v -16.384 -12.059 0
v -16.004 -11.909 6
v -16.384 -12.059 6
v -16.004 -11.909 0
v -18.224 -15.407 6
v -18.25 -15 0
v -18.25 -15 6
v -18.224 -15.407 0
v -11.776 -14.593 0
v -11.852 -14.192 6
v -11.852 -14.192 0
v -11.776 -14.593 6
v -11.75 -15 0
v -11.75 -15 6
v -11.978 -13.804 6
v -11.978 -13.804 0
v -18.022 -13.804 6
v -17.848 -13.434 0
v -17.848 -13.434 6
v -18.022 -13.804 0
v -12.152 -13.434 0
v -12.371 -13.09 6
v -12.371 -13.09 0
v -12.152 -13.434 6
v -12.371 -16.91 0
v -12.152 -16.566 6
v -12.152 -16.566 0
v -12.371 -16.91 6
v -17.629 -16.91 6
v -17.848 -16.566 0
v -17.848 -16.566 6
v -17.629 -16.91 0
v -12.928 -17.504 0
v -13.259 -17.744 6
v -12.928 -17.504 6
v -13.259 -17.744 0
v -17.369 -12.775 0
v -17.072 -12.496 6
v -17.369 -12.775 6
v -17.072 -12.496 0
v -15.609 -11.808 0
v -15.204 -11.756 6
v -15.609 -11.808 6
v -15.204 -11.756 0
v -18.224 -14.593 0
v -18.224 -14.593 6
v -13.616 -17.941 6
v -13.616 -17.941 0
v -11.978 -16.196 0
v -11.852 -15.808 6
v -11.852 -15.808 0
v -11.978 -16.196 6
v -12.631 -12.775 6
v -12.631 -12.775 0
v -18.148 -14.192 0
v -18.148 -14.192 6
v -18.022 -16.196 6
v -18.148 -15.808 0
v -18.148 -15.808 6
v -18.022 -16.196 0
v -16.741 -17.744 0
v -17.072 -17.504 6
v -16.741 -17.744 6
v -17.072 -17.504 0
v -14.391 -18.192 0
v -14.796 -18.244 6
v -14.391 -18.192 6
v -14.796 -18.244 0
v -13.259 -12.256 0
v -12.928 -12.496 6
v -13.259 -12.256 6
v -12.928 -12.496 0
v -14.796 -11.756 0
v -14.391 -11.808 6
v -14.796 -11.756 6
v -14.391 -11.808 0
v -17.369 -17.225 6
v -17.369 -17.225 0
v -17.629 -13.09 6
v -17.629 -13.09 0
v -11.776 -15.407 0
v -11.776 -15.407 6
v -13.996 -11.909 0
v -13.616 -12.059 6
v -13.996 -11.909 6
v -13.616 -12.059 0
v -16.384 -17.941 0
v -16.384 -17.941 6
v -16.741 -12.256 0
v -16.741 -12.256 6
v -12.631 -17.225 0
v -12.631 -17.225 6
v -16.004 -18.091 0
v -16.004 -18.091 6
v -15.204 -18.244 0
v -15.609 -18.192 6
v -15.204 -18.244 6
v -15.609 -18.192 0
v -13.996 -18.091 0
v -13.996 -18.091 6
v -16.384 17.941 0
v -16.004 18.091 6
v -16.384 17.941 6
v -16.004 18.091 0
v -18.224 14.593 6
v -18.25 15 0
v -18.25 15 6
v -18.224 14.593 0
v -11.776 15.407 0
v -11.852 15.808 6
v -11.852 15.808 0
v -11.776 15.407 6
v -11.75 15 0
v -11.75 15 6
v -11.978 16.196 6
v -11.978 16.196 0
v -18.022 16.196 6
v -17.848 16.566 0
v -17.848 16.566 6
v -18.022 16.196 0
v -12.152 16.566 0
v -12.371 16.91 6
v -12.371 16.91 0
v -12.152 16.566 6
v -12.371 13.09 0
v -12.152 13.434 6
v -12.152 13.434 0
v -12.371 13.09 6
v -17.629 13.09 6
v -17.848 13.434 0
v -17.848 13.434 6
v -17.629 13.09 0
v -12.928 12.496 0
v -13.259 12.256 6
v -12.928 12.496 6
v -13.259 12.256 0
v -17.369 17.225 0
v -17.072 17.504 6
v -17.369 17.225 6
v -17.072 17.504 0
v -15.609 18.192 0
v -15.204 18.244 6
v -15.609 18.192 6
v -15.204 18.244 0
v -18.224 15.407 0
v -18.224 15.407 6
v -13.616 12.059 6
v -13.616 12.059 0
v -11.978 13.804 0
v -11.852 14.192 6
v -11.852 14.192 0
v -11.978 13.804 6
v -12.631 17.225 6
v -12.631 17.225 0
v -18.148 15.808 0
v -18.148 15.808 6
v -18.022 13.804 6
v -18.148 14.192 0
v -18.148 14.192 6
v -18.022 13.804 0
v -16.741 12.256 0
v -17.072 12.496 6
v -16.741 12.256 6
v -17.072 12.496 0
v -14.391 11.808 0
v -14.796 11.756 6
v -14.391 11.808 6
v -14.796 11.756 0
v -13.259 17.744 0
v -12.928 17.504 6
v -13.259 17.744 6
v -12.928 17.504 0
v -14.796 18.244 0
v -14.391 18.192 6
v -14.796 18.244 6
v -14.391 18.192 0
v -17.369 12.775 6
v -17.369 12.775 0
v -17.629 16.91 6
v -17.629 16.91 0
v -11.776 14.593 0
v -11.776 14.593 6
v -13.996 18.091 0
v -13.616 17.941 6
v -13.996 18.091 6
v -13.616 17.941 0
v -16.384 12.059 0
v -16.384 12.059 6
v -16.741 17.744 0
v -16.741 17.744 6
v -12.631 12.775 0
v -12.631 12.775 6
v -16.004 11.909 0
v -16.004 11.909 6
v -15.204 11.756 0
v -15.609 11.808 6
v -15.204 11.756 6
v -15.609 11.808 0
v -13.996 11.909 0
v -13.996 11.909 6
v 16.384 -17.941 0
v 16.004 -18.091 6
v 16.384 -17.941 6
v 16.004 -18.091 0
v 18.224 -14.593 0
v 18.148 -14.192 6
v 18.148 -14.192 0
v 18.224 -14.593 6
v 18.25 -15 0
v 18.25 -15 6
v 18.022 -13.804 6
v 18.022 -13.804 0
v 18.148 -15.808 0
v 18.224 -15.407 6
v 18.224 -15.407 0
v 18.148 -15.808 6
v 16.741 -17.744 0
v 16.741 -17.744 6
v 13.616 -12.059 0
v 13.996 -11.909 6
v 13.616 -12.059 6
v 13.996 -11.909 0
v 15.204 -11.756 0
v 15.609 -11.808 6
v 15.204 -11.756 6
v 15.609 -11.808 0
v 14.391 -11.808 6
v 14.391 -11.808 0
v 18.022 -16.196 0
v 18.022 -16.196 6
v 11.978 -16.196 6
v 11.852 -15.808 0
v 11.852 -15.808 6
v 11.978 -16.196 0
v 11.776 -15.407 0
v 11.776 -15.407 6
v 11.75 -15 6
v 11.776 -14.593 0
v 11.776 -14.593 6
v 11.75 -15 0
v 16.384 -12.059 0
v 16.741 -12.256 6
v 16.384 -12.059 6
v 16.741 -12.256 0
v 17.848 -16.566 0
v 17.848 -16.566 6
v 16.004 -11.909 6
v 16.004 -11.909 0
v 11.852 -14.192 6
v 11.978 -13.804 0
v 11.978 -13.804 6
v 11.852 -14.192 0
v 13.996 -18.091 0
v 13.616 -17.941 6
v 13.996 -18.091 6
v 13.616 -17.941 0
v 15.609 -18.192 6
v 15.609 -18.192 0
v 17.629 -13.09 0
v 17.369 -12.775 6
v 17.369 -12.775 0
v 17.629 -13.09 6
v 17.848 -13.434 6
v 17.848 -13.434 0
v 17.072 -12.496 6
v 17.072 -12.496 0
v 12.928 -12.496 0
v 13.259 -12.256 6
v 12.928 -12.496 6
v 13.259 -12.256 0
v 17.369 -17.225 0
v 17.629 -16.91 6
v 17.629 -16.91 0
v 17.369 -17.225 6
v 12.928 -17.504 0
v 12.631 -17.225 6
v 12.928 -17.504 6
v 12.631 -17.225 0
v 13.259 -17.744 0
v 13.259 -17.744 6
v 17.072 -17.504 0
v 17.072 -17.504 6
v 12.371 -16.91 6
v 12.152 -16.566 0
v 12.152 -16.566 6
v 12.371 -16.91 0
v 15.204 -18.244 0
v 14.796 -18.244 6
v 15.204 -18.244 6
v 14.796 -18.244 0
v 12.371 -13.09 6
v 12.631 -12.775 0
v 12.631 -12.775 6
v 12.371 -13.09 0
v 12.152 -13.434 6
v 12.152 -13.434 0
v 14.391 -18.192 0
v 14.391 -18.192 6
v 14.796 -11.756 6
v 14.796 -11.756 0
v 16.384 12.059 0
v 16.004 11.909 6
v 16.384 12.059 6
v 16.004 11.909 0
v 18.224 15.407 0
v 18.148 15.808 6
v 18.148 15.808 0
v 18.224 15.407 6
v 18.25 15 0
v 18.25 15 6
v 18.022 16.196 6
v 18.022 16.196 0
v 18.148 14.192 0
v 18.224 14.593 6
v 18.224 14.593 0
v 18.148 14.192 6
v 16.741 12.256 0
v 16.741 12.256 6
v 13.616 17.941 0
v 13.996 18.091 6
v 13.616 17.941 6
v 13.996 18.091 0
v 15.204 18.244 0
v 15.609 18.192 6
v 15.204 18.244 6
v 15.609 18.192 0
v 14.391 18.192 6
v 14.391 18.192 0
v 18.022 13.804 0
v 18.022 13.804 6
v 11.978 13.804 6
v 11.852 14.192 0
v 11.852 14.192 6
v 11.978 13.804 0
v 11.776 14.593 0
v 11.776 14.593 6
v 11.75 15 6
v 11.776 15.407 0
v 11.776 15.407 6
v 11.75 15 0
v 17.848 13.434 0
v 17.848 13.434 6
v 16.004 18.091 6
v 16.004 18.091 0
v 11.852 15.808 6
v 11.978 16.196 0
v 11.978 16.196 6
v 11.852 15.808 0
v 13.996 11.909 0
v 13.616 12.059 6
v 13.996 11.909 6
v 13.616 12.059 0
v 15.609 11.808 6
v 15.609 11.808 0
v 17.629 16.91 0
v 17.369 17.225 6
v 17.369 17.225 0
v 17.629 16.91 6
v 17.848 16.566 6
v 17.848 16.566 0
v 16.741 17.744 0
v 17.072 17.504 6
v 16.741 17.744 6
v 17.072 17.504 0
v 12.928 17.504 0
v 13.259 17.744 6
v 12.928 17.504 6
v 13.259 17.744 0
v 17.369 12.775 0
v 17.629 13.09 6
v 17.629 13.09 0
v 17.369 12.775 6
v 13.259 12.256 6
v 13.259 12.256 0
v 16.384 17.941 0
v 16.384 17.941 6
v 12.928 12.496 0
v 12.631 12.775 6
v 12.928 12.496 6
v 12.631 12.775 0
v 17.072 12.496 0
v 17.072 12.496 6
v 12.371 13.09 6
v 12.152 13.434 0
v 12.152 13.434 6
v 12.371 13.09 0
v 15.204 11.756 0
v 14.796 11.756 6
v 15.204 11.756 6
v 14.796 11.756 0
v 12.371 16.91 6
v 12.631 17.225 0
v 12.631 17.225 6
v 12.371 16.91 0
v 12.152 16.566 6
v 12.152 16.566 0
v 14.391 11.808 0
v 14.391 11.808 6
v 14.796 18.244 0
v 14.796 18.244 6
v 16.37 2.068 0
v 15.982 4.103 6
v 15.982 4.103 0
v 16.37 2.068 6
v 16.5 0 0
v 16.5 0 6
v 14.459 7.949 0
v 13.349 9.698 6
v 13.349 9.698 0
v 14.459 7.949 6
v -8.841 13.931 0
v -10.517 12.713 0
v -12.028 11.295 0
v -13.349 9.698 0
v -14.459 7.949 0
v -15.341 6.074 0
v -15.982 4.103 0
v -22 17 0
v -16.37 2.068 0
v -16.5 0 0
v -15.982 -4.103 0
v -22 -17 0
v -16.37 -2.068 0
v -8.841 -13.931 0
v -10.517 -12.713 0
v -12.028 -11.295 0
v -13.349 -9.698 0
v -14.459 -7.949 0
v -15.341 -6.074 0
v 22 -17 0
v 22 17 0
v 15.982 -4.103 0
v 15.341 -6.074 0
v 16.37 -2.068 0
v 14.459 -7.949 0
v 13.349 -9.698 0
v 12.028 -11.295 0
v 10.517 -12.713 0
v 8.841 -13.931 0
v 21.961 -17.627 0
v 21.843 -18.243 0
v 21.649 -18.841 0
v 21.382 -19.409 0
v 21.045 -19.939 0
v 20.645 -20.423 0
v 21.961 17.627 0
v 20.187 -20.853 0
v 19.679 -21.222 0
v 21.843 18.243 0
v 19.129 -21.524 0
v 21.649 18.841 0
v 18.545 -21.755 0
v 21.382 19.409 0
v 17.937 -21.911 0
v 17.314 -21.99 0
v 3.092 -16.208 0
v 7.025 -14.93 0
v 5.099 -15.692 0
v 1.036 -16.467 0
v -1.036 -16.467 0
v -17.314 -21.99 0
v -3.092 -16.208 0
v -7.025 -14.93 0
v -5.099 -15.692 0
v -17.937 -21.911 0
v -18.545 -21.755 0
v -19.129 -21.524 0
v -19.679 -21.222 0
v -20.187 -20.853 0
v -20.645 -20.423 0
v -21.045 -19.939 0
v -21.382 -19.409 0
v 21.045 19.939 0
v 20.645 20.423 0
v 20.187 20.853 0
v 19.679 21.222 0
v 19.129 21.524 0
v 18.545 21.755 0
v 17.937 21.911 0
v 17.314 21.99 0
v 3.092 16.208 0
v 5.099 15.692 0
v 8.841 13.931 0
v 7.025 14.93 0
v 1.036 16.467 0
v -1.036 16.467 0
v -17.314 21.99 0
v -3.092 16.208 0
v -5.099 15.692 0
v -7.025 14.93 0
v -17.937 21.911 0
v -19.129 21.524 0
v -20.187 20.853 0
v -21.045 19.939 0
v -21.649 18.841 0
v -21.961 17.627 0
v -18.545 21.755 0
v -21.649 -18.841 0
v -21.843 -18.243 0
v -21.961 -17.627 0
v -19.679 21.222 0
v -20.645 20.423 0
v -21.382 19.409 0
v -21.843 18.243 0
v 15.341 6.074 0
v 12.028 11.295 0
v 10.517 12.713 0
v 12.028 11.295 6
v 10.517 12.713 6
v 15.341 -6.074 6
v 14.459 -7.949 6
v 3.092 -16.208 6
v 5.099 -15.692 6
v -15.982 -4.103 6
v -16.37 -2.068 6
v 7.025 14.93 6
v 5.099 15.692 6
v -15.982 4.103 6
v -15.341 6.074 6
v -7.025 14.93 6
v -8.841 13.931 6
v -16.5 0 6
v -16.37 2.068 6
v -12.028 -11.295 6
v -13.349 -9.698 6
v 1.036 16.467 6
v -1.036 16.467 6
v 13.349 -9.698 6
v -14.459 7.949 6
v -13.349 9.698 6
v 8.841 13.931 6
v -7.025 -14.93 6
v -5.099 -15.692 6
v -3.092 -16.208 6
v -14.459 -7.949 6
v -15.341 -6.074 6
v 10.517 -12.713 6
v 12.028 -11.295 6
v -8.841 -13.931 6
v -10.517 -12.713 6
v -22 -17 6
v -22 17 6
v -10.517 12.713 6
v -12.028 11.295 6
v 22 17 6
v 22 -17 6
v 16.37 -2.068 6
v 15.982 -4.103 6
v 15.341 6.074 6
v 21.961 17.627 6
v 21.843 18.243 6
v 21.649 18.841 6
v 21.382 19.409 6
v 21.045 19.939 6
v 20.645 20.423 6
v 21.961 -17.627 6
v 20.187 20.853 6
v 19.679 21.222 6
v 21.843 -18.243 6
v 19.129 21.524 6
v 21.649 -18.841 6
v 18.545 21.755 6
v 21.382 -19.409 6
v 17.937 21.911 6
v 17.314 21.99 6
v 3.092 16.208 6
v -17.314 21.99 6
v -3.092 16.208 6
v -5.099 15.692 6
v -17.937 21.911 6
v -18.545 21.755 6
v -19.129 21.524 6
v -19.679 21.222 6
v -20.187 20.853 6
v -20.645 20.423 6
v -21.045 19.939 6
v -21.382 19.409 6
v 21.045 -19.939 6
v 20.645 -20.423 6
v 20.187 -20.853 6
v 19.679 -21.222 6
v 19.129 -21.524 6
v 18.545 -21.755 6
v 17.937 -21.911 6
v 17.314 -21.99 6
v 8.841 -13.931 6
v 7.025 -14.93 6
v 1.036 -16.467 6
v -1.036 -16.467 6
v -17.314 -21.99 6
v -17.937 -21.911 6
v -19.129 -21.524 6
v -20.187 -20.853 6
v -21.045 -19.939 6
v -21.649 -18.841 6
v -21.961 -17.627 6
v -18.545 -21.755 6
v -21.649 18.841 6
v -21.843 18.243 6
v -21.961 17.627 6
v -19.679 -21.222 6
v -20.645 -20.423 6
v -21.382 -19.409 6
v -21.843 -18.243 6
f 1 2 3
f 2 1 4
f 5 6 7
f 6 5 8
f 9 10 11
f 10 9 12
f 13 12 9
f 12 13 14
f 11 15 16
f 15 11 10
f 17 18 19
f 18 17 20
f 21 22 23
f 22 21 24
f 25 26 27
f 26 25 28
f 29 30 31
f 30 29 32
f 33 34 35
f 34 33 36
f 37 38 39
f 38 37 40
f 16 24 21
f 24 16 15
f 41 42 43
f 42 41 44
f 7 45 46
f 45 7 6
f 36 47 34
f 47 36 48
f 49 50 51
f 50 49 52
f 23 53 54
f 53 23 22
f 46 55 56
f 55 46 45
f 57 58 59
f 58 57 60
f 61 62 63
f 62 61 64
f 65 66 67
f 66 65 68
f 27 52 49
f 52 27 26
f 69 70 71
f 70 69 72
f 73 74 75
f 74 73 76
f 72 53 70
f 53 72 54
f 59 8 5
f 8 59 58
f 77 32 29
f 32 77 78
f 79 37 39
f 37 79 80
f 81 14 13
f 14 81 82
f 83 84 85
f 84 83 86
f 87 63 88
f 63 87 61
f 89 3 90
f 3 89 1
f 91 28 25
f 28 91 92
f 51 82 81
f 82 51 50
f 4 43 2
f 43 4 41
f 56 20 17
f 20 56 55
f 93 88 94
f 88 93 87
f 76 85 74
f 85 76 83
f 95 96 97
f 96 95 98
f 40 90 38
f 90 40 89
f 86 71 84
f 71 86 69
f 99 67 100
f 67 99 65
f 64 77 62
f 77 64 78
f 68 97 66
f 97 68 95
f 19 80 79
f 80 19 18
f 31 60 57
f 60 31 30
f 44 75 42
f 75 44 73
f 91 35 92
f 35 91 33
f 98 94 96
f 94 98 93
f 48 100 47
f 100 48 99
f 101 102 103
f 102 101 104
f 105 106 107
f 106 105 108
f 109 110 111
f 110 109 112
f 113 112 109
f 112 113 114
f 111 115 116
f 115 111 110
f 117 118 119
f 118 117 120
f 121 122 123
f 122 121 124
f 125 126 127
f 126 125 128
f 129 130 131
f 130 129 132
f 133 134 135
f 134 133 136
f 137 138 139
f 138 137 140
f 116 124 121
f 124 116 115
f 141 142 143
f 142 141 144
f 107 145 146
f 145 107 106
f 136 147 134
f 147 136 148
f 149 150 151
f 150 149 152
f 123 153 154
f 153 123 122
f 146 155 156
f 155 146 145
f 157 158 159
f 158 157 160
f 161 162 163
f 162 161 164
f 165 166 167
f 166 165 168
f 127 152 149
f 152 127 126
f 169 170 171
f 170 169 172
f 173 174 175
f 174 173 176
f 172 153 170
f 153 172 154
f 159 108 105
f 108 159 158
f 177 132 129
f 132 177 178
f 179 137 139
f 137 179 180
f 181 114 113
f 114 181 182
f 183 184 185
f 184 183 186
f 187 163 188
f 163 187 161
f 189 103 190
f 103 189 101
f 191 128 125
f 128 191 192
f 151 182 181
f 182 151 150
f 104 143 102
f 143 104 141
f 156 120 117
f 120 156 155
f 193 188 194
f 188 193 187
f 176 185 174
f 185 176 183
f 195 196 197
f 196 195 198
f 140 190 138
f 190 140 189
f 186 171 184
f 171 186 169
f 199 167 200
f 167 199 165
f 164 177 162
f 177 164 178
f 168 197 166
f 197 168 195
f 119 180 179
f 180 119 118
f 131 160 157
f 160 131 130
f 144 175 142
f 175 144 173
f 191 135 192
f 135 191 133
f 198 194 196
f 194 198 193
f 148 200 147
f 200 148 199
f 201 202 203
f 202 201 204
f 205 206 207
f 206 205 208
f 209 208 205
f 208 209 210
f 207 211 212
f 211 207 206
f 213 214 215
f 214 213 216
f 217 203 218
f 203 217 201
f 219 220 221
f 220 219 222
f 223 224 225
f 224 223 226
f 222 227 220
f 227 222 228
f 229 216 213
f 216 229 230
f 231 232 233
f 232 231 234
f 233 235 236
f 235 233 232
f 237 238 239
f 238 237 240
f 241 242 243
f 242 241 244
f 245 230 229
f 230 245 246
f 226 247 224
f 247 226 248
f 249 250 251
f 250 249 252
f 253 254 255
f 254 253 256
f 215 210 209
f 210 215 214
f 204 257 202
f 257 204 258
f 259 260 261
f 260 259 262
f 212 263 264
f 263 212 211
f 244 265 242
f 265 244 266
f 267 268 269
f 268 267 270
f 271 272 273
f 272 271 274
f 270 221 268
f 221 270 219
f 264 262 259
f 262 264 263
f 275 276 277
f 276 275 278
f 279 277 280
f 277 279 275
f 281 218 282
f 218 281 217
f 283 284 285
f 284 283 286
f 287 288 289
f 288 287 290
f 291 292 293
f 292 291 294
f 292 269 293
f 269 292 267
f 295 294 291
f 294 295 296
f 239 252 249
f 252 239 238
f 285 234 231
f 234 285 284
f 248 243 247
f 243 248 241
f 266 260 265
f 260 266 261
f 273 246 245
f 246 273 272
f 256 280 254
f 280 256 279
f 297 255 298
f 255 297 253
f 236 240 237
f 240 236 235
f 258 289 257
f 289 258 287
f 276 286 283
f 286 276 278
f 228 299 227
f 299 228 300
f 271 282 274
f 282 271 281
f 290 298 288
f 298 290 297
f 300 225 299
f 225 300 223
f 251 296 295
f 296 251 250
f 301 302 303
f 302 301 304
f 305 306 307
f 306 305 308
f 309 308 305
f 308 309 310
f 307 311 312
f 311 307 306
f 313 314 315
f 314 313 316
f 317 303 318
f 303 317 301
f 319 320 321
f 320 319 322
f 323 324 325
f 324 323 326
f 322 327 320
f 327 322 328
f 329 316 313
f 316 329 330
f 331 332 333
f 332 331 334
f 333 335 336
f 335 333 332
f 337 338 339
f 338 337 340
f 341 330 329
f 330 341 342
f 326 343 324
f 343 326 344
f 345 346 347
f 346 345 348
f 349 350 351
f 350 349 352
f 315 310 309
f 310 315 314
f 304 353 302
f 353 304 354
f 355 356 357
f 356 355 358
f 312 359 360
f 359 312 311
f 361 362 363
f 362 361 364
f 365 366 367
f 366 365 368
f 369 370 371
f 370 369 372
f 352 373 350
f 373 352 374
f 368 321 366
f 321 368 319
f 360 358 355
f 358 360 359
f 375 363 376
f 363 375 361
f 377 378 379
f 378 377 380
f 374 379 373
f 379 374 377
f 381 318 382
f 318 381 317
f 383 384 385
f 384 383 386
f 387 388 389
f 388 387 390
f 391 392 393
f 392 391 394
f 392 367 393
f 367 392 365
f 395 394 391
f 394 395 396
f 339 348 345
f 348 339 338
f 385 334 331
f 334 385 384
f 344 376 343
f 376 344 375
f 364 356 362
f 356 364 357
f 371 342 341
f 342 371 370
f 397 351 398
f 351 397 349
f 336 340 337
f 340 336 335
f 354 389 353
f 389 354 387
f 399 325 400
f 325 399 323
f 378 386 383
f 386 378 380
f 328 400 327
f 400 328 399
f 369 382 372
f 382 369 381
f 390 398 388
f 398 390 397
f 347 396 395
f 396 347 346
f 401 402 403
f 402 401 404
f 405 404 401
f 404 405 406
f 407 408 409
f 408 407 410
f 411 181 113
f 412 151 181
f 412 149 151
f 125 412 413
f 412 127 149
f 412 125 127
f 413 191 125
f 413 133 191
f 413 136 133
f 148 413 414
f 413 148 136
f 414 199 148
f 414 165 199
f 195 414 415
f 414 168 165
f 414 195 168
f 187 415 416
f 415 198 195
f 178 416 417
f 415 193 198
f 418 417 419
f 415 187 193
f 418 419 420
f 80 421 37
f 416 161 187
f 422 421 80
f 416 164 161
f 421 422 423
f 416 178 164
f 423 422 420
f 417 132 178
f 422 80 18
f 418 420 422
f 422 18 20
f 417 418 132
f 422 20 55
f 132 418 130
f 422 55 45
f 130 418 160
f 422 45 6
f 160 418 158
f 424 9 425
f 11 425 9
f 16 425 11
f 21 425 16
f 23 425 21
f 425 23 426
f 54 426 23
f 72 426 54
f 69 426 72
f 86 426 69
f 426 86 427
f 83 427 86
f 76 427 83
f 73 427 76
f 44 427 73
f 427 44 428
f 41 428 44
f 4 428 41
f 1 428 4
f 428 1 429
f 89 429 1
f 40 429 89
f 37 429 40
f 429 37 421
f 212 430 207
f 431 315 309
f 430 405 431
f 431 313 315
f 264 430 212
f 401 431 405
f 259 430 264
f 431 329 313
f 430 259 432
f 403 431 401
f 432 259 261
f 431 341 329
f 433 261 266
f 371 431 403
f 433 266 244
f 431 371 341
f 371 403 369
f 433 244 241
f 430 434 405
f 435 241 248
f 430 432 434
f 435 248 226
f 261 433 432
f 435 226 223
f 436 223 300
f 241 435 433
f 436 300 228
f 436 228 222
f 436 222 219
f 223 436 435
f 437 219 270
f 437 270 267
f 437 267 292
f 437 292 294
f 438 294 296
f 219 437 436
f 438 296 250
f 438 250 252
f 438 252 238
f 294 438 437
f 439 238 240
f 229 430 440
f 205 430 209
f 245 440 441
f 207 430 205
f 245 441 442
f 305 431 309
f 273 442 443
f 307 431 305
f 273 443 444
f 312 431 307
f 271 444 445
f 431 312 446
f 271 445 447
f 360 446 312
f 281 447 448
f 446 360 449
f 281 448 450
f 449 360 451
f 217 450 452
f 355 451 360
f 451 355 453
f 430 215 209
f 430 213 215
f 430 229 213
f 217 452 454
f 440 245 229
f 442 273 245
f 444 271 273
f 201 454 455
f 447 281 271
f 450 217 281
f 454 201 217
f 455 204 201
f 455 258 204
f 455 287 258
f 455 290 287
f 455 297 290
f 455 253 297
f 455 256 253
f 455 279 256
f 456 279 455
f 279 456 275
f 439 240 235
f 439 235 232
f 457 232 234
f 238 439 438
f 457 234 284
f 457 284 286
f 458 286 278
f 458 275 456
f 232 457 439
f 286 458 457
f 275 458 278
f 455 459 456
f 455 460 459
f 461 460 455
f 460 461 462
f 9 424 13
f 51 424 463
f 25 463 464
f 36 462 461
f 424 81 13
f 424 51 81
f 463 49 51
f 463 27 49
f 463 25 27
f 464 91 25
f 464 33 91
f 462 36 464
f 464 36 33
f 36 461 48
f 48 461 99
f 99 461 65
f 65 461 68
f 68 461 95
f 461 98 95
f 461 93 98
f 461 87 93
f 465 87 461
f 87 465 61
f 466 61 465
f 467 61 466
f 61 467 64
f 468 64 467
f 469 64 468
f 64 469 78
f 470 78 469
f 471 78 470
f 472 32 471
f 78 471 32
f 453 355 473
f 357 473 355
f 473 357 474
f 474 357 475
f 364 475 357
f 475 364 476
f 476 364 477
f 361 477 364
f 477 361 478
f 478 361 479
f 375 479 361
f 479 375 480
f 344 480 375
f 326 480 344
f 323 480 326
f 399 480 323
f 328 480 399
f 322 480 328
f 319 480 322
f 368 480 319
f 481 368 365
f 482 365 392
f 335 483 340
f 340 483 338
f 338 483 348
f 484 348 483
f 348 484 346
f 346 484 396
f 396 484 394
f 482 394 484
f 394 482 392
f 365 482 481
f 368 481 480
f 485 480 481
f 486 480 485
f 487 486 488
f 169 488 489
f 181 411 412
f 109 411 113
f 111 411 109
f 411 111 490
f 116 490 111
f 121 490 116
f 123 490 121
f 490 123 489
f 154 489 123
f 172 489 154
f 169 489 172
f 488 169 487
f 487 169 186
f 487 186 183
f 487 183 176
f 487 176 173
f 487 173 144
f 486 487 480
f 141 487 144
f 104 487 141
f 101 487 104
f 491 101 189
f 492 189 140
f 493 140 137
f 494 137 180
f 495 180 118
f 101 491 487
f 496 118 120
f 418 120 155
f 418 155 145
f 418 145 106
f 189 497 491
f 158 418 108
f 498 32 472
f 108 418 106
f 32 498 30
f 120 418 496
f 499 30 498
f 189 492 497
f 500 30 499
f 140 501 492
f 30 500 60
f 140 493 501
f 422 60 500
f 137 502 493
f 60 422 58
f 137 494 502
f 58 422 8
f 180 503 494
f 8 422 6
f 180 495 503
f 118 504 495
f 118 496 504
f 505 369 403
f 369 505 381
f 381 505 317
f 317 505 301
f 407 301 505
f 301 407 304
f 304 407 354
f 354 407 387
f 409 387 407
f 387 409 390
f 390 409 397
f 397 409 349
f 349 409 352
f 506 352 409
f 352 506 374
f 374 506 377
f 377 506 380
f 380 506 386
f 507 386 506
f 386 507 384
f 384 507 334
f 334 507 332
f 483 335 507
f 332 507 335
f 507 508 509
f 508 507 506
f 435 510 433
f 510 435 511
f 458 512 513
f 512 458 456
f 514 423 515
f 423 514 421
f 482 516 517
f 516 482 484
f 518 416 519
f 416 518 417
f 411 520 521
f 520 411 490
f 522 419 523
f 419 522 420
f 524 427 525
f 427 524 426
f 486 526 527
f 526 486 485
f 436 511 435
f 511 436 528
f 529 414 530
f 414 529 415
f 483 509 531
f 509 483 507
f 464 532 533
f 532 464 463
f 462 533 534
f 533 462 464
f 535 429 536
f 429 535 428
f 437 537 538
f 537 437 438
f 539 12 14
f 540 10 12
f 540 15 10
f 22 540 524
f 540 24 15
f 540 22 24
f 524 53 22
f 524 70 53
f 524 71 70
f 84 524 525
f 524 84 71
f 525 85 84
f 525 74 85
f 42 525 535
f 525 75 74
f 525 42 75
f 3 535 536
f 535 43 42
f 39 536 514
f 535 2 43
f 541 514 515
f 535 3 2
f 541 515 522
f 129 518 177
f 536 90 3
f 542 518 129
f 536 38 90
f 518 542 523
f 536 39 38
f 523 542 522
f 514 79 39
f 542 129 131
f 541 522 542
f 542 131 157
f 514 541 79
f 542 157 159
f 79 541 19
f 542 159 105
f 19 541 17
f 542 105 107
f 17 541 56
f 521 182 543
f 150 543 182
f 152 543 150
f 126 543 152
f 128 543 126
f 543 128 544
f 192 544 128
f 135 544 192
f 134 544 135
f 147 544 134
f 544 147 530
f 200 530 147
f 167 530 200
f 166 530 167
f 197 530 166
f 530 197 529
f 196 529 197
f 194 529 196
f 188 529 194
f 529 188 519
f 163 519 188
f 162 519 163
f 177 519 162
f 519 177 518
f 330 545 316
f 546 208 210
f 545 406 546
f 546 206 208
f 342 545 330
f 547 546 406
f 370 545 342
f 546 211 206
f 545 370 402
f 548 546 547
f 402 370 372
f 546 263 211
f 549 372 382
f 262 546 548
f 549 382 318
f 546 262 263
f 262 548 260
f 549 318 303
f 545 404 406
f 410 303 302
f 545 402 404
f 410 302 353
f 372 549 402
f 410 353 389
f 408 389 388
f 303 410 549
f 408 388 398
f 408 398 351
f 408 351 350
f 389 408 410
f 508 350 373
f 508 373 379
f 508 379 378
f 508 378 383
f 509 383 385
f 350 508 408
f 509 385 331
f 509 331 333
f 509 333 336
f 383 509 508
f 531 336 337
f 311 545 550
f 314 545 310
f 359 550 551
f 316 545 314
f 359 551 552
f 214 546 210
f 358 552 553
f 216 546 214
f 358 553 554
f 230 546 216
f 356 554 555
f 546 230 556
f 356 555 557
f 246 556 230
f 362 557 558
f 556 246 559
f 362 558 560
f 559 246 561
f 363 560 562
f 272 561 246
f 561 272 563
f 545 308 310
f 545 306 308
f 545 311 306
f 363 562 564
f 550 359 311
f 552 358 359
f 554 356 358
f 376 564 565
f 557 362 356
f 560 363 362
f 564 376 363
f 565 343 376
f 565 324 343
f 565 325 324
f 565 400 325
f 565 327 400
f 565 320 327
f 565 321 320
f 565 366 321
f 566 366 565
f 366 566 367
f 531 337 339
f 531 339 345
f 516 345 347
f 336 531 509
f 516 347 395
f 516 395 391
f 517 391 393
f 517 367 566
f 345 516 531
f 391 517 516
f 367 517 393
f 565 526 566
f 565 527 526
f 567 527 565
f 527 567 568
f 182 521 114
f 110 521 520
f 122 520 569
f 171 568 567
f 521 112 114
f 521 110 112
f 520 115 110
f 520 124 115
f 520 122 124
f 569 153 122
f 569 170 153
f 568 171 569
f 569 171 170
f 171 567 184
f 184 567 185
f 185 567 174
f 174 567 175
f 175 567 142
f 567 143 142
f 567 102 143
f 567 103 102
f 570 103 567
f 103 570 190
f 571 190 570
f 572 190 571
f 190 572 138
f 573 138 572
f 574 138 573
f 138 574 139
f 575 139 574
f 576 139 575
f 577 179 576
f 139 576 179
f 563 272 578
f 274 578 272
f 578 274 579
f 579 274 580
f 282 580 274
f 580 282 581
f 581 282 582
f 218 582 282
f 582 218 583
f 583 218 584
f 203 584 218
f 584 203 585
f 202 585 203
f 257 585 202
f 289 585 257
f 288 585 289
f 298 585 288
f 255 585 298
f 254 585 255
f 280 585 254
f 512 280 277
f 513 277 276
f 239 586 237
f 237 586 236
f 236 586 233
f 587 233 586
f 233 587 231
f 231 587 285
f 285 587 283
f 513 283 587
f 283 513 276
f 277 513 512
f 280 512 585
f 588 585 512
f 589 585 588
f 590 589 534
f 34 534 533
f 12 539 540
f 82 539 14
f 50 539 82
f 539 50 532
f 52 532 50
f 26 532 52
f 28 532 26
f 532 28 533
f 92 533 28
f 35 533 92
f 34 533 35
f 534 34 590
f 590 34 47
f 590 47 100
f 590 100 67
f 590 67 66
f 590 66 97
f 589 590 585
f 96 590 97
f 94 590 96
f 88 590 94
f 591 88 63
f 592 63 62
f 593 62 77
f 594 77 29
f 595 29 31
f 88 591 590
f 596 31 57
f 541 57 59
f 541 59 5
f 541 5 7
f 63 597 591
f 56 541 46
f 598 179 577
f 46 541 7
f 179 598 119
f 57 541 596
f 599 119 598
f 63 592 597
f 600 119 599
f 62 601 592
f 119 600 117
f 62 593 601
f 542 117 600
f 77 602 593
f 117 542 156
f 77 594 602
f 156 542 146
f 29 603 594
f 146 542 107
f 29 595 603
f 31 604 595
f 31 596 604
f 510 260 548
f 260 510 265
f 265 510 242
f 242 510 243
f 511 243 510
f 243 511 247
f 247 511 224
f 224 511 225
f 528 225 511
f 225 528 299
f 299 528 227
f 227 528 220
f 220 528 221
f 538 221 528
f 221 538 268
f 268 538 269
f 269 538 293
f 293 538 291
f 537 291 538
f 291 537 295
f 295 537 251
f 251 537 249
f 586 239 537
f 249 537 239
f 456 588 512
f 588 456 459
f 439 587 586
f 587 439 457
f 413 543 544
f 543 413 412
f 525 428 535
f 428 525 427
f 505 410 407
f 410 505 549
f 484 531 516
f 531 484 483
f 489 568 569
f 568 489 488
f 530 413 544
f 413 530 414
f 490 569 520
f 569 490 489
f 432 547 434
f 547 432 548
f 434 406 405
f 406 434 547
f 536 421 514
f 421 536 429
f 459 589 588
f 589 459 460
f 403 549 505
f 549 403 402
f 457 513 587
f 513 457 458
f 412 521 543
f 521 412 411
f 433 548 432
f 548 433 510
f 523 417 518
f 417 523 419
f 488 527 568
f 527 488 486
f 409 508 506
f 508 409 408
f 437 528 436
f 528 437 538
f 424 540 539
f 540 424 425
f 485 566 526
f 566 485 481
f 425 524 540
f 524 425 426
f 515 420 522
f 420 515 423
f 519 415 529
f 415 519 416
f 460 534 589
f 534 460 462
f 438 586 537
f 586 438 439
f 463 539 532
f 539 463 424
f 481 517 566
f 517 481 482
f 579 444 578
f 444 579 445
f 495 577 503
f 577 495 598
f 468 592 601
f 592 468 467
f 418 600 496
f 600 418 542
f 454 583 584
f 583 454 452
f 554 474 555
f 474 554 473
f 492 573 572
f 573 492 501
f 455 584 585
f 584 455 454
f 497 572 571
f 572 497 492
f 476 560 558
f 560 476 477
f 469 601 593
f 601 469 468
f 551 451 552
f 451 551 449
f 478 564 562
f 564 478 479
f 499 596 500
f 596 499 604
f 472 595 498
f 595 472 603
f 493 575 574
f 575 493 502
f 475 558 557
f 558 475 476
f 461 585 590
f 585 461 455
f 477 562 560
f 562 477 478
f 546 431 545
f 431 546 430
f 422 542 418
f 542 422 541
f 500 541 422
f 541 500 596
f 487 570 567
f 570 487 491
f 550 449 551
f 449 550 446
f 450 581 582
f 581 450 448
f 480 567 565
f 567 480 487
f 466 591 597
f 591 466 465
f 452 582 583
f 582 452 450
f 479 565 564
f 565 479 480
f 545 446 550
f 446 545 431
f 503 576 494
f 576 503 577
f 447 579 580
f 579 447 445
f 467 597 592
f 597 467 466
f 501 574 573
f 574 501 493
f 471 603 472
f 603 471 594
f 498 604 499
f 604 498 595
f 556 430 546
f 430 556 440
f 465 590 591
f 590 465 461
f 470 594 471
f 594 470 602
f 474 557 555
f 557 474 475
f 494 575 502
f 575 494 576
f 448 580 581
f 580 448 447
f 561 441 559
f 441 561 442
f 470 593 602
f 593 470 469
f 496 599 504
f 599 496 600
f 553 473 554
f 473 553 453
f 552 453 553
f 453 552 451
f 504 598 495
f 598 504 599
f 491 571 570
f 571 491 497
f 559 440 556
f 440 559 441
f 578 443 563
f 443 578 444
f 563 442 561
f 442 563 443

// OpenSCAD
$fn = 50;

difference() {
	union() {
		hull() {
			translate(v = [-17.0, 17.0, 0]) {
				cylinder(h = 6, r = 5);
			}
			translate(v = [17.0, 17.0, 0]) {
				cylinder(h = 6, r = 5);
			}
			translate(v = [-17.0, -17.0, 0]) {
				cylinder(h = 6, r = 5);
			}
			translate(v = [17.0, -17.0, 0]) {
				cylinder(h = 6, r = 5);
			}
		}
	}
	union() {
		translate(v = [-15.0, -15.0, -100.0]) {
			cylinder(h = 200, r = 3.25);
		}
		translate(v = [-15.0, 15.0, -100.0]) {
			cylinder(h = 200, r = 3.25);
		}
		translate(v = [15.0, -15.0, -100.0]) {
			cylinder(h = 200, r = 3.25);
		}
		translate(v = [15.0, 15.0, -100.0]) {
			cylinder(h = 200, r = 3.25);
		}
		translate(v = [-15.0, -15.0, -100.0]) {
			cylinder(h = 200, r = 1.8);
		}
		translate(v = [-15.0, 15.0, -100.0]) {
			cylinder(h = 200, r = 1.8);
		}
		translate(v = [15.0, -15.0, -100.0]) {
			cylinder(h = 200, r = 1.8);
		}
		translate(v = [15.0, 15.0, -100.0]) {
			cylinder(h = 200, r = 1.8);
		}
		cylinder(h = 6, r = 16.5);
	}
}
